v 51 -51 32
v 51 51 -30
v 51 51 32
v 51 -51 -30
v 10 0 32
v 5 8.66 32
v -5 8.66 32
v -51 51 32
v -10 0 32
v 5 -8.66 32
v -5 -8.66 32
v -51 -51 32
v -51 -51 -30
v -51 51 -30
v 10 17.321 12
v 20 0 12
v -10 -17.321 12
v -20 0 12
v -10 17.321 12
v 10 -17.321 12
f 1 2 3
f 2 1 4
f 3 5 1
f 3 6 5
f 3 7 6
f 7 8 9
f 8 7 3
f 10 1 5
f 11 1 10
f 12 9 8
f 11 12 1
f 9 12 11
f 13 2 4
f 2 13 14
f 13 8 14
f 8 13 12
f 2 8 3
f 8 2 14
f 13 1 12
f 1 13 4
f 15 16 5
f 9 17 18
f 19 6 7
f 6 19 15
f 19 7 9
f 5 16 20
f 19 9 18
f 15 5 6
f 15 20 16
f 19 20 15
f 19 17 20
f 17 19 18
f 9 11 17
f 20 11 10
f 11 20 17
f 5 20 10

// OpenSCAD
difference()
{
  *import("matterhorn10k.stl");
  translate([-51,-51,-30]) cube([102,102,62]);
  translate([0,0,12]) cylinder(r1=20,r2=10,h=20,$fn=6);
}
/*
translate([0,0,-3.4]) cylinder(d=15,h=3.4,$fn=32);
translate([-4.25,-4.25,0]) cube([8.5,8.5,14.7]);
for(f=[1:0.82:11])
  translate([0,0,2.8+f]) rotate([0,0,45]) {
    cylinder(d1=12,d2=12.5,h=0.4,$fn=4);
    translate([0,0,0.4]) cylinder(d=12.5,h=0.3,$fn=4);
  }
for(vm=[0:1],hm=[0:1],wr=[0,90]) rotate([0,0,wr])  mirror([vm,0]) mirror([0,hm]) translate([4.045,-1.55]) linear_extrude(16.5) rotate([0,0,-90]) scale(0.375) {
  translate([1,0]) square([1,2]);
  square([3,1]);
}
for(f=[1,2.6,13.6]) translate([0,0,f]) rotate([0,0,45]) {
    cylinder(d1=12,d2=13.5,h=0.4,$fn=4);
  translate([0,0,0.4]) cylinder(d=13.5,h=f>5?0.8:0.5,$fn=4);
}
  translate([-2.125,-2.125,14.8]) difference() {
    cube([4.25,4.25,2.8]);
    translate([0.2,0.2,2.6]) cube([3.85,3.85,2]);
    translate([2.125,2.125,2.4]) linear_extrude(2) {
      difference(){
        circle(d=3,$fn=20);
        circle(d=2.8,$fn=20);
      }
      text("H",size=1.8,valign="center",halign="center");
    }
  }
  translate([-4.2,-2.125,14.8]) difference() {
    cube([8.4,4.25,1.4]);
    translate([0.2,0.2,1.2]) cube([8,3.85,2]);
  }
  translate([-2.125,-4.2,14.8]) difference(){
    cube([4.25,8.4,1.4]);
    translate([0.2,0.2,1.2]) cube([3.85,8,2]);
  }
  translate([-4.2,-4.2,14.8]) difference() {
    cube([8.4,8.4,.4]);
    translate([0.2,0.2,0.2]) cube([8,8,.6]);
  }
*#translate([0,0,-1]) import("Settlers_of_Catan_Dual_Extrusion_Complete_Original___5-6_Player_Expansion_with_magnetic_tile_bases_and_full_storage_case/files/Player-Modern-City.stl");
//*/
